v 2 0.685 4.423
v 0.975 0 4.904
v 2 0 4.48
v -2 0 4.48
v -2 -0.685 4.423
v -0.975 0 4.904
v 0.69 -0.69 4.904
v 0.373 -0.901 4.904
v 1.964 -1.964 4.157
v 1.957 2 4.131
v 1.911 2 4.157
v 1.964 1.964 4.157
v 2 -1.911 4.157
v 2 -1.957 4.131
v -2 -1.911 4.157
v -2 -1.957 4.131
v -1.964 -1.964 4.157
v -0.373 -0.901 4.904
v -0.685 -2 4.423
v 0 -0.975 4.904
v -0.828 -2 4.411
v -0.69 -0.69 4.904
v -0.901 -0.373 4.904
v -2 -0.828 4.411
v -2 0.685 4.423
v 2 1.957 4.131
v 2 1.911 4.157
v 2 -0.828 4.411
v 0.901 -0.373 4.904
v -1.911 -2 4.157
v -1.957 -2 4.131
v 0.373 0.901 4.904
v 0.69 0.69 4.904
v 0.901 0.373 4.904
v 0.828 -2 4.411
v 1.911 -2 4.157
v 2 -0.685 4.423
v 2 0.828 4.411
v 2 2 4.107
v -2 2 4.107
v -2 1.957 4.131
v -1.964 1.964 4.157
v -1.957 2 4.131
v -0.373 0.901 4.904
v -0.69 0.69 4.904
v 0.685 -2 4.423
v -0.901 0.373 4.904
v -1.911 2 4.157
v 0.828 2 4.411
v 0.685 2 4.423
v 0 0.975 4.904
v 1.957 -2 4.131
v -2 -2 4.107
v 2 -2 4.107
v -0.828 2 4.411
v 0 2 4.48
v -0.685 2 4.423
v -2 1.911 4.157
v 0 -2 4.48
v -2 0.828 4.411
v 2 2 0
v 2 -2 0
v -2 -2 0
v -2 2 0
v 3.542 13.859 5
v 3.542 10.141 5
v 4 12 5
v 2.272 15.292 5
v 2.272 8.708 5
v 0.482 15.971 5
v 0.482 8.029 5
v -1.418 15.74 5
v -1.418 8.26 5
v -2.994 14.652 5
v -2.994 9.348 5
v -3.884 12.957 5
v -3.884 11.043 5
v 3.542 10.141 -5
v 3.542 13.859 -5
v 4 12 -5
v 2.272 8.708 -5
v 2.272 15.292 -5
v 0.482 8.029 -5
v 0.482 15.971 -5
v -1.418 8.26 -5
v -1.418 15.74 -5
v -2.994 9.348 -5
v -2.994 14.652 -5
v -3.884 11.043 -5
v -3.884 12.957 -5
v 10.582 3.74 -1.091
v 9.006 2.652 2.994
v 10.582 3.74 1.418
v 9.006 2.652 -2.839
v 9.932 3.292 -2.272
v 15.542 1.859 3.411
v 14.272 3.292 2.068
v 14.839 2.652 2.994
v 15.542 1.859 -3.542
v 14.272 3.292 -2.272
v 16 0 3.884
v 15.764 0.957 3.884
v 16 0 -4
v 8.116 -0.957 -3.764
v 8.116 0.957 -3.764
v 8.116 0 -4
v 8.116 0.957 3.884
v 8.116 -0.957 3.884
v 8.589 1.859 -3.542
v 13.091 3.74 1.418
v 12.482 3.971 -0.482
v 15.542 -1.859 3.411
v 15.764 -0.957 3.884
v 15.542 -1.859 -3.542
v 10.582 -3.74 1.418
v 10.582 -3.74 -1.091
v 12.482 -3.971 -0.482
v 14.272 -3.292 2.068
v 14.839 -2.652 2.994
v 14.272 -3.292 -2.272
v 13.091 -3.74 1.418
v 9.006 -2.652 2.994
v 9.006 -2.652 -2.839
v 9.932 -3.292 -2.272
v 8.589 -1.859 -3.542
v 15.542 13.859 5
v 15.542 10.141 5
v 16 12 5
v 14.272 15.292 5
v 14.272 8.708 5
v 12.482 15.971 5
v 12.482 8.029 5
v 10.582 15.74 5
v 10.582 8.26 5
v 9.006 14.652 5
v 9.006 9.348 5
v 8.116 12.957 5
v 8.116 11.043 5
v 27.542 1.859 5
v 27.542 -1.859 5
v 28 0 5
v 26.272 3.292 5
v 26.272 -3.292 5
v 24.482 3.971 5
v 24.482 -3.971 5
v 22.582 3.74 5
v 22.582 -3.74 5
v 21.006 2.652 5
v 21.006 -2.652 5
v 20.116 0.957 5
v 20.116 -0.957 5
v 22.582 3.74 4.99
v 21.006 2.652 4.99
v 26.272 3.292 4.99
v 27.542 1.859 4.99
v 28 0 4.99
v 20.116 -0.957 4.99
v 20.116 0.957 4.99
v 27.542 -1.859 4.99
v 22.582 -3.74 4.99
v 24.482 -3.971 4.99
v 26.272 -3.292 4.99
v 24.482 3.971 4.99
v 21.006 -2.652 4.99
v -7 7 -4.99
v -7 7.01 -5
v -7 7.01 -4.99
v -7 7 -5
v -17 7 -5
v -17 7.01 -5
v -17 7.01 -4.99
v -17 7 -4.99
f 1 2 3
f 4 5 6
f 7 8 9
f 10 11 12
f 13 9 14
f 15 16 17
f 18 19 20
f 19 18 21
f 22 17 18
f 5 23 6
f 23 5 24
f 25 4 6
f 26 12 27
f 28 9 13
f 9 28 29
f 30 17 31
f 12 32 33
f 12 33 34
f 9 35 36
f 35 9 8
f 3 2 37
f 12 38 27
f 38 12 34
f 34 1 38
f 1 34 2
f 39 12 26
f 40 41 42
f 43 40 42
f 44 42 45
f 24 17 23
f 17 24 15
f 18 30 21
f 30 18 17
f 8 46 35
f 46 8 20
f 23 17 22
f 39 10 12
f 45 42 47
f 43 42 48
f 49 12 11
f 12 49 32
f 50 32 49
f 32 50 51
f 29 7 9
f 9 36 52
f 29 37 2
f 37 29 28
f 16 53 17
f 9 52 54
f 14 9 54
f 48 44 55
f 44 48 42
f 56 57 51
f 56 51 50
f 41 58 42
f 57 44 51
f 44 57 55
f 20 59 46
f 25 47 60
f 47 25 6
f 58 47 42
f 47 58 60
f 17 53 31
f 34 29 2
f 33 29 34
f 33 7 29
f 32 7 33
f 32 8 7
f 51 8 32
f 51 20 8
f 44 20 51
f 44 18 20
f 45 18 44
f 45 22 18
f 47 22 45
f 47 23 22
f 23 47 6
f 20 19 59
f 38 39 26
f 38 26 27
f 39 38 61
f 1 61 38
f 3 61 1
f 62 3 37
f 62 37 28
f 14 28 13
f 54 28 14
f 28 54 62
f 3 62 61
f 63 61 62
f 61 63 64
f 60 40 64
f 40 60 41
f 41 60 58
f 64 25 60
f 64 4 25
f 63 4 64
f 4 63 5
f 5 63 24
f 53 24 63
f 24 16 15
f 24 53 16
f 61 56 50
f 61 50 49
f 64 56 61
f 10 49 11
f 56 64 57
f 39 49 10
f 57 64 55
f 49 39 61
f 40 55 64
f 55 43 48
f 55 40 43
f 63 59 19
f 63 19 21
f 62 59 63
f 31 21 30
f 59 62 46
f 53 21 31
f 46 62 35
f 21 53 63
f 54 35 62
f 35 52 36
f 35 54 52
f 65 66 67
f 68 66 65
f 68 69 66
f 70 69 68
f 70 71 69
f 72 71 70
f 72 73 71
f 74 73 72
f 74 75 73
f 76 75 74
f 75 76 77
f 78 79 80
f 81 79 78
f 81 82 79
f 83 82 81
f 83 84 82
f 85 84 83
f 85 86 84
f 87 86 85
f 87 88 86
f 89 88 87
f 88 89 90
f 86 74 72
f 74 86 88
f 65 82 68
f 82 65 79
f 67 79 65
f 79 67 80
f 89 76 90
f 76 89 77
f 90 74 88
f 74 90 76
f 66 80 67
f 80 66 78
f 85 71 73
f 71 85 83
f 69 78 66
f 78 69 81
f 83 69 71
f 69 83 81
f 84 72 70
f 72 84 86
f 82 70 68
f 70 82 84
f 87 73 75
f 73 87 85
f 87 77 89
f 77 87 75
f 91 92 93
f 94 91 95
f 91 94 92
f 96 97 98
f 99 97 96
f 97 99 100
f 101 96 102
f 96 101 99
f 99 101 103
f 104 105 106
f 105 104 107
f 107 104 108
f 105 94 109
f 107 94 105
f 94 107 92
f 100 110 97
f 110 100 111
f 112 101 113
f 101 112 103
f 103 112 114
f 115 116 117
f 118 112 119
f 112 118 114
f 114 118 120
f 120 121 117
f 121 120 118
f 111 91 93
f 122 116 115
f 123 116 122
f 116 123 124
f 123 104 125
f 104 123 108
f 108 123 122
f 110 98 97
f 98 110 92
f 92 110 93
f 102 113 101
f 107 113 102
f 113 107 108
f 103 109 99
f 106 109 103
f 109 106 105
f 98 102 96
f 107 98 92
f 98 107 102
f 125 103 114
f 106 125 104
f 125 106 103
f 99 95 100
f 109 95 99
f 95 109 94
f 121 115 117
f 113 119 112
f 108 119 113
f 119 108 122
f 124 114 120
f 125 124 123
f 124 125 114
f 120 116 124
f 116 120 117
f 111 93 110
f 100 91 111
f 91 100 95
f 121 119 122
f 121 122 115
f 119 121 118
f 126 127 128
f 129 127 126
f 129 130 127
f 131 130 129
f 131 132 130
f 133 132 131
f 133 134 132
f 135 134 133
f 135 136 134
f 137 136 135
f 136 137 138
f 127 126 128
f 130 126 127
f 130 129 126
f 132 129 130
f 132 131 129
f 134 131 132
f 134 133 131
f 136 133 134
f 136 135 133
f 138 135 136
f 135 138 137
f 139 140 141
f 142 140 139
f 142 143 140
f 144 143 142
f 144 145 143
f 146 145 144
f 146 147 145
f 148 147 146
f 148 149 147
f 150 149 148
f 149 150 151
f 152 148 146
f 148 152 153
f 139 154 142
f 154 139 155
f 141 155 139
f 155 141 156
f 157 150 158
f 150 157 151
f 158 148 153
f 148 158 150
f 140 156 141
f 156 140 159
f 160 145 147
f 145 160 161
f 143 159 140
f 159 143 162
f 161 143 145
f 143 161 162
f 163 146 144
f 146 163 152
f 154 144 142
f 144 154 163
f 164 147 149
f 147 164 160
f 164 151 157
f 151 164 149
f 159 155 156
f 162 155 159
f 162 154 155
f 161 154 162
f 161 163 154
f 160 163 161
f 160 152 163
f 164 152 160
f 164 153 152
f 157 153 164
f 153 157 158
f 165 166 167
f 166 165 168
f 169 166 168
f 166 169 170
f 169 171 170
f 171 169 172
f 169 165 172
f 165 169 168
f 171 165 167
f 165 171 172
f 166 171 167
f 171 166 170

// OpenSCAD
intersection() {
  sphere(r=5);
  translate([0,0,3]) cube([4,4,6], center=true);
}

translate([0,12,0]) intersection() {
  cube([10,10,10], center=true);
  cylinder(r=4, h=12, center=true);
}

translate([12,0,0]) intersection() {
  cube([10,10,10], center=true);
  cylinder(r=4, h=12, center=true);
  rotate([0,90,0]) cylinder(r=4, h=12, center=true);
}

translate([12,12,0]) intersection() {
  cube([10,10,10], center=true);
  translate([0,0,7]) cylinder(r=4, h=4, center=true);
}

translate([24,0,0]) intersection() {
  cube([10,10,10], center=true);
  translate([0,0,6.99]) cylinder(r=4, h=4, center=true);
}

translate([-12,0,0]) intersection() {
  cube([10,10,10], center=true);
  translate([0,-10,-10]) cube([10,10,10], center=true);
}

translate([-12,12,0]) intersection() {
  cube([10,10,10], center=true);
  translate([0,-9.99,-9.99]) cube([10,10,10], center=true);
}
